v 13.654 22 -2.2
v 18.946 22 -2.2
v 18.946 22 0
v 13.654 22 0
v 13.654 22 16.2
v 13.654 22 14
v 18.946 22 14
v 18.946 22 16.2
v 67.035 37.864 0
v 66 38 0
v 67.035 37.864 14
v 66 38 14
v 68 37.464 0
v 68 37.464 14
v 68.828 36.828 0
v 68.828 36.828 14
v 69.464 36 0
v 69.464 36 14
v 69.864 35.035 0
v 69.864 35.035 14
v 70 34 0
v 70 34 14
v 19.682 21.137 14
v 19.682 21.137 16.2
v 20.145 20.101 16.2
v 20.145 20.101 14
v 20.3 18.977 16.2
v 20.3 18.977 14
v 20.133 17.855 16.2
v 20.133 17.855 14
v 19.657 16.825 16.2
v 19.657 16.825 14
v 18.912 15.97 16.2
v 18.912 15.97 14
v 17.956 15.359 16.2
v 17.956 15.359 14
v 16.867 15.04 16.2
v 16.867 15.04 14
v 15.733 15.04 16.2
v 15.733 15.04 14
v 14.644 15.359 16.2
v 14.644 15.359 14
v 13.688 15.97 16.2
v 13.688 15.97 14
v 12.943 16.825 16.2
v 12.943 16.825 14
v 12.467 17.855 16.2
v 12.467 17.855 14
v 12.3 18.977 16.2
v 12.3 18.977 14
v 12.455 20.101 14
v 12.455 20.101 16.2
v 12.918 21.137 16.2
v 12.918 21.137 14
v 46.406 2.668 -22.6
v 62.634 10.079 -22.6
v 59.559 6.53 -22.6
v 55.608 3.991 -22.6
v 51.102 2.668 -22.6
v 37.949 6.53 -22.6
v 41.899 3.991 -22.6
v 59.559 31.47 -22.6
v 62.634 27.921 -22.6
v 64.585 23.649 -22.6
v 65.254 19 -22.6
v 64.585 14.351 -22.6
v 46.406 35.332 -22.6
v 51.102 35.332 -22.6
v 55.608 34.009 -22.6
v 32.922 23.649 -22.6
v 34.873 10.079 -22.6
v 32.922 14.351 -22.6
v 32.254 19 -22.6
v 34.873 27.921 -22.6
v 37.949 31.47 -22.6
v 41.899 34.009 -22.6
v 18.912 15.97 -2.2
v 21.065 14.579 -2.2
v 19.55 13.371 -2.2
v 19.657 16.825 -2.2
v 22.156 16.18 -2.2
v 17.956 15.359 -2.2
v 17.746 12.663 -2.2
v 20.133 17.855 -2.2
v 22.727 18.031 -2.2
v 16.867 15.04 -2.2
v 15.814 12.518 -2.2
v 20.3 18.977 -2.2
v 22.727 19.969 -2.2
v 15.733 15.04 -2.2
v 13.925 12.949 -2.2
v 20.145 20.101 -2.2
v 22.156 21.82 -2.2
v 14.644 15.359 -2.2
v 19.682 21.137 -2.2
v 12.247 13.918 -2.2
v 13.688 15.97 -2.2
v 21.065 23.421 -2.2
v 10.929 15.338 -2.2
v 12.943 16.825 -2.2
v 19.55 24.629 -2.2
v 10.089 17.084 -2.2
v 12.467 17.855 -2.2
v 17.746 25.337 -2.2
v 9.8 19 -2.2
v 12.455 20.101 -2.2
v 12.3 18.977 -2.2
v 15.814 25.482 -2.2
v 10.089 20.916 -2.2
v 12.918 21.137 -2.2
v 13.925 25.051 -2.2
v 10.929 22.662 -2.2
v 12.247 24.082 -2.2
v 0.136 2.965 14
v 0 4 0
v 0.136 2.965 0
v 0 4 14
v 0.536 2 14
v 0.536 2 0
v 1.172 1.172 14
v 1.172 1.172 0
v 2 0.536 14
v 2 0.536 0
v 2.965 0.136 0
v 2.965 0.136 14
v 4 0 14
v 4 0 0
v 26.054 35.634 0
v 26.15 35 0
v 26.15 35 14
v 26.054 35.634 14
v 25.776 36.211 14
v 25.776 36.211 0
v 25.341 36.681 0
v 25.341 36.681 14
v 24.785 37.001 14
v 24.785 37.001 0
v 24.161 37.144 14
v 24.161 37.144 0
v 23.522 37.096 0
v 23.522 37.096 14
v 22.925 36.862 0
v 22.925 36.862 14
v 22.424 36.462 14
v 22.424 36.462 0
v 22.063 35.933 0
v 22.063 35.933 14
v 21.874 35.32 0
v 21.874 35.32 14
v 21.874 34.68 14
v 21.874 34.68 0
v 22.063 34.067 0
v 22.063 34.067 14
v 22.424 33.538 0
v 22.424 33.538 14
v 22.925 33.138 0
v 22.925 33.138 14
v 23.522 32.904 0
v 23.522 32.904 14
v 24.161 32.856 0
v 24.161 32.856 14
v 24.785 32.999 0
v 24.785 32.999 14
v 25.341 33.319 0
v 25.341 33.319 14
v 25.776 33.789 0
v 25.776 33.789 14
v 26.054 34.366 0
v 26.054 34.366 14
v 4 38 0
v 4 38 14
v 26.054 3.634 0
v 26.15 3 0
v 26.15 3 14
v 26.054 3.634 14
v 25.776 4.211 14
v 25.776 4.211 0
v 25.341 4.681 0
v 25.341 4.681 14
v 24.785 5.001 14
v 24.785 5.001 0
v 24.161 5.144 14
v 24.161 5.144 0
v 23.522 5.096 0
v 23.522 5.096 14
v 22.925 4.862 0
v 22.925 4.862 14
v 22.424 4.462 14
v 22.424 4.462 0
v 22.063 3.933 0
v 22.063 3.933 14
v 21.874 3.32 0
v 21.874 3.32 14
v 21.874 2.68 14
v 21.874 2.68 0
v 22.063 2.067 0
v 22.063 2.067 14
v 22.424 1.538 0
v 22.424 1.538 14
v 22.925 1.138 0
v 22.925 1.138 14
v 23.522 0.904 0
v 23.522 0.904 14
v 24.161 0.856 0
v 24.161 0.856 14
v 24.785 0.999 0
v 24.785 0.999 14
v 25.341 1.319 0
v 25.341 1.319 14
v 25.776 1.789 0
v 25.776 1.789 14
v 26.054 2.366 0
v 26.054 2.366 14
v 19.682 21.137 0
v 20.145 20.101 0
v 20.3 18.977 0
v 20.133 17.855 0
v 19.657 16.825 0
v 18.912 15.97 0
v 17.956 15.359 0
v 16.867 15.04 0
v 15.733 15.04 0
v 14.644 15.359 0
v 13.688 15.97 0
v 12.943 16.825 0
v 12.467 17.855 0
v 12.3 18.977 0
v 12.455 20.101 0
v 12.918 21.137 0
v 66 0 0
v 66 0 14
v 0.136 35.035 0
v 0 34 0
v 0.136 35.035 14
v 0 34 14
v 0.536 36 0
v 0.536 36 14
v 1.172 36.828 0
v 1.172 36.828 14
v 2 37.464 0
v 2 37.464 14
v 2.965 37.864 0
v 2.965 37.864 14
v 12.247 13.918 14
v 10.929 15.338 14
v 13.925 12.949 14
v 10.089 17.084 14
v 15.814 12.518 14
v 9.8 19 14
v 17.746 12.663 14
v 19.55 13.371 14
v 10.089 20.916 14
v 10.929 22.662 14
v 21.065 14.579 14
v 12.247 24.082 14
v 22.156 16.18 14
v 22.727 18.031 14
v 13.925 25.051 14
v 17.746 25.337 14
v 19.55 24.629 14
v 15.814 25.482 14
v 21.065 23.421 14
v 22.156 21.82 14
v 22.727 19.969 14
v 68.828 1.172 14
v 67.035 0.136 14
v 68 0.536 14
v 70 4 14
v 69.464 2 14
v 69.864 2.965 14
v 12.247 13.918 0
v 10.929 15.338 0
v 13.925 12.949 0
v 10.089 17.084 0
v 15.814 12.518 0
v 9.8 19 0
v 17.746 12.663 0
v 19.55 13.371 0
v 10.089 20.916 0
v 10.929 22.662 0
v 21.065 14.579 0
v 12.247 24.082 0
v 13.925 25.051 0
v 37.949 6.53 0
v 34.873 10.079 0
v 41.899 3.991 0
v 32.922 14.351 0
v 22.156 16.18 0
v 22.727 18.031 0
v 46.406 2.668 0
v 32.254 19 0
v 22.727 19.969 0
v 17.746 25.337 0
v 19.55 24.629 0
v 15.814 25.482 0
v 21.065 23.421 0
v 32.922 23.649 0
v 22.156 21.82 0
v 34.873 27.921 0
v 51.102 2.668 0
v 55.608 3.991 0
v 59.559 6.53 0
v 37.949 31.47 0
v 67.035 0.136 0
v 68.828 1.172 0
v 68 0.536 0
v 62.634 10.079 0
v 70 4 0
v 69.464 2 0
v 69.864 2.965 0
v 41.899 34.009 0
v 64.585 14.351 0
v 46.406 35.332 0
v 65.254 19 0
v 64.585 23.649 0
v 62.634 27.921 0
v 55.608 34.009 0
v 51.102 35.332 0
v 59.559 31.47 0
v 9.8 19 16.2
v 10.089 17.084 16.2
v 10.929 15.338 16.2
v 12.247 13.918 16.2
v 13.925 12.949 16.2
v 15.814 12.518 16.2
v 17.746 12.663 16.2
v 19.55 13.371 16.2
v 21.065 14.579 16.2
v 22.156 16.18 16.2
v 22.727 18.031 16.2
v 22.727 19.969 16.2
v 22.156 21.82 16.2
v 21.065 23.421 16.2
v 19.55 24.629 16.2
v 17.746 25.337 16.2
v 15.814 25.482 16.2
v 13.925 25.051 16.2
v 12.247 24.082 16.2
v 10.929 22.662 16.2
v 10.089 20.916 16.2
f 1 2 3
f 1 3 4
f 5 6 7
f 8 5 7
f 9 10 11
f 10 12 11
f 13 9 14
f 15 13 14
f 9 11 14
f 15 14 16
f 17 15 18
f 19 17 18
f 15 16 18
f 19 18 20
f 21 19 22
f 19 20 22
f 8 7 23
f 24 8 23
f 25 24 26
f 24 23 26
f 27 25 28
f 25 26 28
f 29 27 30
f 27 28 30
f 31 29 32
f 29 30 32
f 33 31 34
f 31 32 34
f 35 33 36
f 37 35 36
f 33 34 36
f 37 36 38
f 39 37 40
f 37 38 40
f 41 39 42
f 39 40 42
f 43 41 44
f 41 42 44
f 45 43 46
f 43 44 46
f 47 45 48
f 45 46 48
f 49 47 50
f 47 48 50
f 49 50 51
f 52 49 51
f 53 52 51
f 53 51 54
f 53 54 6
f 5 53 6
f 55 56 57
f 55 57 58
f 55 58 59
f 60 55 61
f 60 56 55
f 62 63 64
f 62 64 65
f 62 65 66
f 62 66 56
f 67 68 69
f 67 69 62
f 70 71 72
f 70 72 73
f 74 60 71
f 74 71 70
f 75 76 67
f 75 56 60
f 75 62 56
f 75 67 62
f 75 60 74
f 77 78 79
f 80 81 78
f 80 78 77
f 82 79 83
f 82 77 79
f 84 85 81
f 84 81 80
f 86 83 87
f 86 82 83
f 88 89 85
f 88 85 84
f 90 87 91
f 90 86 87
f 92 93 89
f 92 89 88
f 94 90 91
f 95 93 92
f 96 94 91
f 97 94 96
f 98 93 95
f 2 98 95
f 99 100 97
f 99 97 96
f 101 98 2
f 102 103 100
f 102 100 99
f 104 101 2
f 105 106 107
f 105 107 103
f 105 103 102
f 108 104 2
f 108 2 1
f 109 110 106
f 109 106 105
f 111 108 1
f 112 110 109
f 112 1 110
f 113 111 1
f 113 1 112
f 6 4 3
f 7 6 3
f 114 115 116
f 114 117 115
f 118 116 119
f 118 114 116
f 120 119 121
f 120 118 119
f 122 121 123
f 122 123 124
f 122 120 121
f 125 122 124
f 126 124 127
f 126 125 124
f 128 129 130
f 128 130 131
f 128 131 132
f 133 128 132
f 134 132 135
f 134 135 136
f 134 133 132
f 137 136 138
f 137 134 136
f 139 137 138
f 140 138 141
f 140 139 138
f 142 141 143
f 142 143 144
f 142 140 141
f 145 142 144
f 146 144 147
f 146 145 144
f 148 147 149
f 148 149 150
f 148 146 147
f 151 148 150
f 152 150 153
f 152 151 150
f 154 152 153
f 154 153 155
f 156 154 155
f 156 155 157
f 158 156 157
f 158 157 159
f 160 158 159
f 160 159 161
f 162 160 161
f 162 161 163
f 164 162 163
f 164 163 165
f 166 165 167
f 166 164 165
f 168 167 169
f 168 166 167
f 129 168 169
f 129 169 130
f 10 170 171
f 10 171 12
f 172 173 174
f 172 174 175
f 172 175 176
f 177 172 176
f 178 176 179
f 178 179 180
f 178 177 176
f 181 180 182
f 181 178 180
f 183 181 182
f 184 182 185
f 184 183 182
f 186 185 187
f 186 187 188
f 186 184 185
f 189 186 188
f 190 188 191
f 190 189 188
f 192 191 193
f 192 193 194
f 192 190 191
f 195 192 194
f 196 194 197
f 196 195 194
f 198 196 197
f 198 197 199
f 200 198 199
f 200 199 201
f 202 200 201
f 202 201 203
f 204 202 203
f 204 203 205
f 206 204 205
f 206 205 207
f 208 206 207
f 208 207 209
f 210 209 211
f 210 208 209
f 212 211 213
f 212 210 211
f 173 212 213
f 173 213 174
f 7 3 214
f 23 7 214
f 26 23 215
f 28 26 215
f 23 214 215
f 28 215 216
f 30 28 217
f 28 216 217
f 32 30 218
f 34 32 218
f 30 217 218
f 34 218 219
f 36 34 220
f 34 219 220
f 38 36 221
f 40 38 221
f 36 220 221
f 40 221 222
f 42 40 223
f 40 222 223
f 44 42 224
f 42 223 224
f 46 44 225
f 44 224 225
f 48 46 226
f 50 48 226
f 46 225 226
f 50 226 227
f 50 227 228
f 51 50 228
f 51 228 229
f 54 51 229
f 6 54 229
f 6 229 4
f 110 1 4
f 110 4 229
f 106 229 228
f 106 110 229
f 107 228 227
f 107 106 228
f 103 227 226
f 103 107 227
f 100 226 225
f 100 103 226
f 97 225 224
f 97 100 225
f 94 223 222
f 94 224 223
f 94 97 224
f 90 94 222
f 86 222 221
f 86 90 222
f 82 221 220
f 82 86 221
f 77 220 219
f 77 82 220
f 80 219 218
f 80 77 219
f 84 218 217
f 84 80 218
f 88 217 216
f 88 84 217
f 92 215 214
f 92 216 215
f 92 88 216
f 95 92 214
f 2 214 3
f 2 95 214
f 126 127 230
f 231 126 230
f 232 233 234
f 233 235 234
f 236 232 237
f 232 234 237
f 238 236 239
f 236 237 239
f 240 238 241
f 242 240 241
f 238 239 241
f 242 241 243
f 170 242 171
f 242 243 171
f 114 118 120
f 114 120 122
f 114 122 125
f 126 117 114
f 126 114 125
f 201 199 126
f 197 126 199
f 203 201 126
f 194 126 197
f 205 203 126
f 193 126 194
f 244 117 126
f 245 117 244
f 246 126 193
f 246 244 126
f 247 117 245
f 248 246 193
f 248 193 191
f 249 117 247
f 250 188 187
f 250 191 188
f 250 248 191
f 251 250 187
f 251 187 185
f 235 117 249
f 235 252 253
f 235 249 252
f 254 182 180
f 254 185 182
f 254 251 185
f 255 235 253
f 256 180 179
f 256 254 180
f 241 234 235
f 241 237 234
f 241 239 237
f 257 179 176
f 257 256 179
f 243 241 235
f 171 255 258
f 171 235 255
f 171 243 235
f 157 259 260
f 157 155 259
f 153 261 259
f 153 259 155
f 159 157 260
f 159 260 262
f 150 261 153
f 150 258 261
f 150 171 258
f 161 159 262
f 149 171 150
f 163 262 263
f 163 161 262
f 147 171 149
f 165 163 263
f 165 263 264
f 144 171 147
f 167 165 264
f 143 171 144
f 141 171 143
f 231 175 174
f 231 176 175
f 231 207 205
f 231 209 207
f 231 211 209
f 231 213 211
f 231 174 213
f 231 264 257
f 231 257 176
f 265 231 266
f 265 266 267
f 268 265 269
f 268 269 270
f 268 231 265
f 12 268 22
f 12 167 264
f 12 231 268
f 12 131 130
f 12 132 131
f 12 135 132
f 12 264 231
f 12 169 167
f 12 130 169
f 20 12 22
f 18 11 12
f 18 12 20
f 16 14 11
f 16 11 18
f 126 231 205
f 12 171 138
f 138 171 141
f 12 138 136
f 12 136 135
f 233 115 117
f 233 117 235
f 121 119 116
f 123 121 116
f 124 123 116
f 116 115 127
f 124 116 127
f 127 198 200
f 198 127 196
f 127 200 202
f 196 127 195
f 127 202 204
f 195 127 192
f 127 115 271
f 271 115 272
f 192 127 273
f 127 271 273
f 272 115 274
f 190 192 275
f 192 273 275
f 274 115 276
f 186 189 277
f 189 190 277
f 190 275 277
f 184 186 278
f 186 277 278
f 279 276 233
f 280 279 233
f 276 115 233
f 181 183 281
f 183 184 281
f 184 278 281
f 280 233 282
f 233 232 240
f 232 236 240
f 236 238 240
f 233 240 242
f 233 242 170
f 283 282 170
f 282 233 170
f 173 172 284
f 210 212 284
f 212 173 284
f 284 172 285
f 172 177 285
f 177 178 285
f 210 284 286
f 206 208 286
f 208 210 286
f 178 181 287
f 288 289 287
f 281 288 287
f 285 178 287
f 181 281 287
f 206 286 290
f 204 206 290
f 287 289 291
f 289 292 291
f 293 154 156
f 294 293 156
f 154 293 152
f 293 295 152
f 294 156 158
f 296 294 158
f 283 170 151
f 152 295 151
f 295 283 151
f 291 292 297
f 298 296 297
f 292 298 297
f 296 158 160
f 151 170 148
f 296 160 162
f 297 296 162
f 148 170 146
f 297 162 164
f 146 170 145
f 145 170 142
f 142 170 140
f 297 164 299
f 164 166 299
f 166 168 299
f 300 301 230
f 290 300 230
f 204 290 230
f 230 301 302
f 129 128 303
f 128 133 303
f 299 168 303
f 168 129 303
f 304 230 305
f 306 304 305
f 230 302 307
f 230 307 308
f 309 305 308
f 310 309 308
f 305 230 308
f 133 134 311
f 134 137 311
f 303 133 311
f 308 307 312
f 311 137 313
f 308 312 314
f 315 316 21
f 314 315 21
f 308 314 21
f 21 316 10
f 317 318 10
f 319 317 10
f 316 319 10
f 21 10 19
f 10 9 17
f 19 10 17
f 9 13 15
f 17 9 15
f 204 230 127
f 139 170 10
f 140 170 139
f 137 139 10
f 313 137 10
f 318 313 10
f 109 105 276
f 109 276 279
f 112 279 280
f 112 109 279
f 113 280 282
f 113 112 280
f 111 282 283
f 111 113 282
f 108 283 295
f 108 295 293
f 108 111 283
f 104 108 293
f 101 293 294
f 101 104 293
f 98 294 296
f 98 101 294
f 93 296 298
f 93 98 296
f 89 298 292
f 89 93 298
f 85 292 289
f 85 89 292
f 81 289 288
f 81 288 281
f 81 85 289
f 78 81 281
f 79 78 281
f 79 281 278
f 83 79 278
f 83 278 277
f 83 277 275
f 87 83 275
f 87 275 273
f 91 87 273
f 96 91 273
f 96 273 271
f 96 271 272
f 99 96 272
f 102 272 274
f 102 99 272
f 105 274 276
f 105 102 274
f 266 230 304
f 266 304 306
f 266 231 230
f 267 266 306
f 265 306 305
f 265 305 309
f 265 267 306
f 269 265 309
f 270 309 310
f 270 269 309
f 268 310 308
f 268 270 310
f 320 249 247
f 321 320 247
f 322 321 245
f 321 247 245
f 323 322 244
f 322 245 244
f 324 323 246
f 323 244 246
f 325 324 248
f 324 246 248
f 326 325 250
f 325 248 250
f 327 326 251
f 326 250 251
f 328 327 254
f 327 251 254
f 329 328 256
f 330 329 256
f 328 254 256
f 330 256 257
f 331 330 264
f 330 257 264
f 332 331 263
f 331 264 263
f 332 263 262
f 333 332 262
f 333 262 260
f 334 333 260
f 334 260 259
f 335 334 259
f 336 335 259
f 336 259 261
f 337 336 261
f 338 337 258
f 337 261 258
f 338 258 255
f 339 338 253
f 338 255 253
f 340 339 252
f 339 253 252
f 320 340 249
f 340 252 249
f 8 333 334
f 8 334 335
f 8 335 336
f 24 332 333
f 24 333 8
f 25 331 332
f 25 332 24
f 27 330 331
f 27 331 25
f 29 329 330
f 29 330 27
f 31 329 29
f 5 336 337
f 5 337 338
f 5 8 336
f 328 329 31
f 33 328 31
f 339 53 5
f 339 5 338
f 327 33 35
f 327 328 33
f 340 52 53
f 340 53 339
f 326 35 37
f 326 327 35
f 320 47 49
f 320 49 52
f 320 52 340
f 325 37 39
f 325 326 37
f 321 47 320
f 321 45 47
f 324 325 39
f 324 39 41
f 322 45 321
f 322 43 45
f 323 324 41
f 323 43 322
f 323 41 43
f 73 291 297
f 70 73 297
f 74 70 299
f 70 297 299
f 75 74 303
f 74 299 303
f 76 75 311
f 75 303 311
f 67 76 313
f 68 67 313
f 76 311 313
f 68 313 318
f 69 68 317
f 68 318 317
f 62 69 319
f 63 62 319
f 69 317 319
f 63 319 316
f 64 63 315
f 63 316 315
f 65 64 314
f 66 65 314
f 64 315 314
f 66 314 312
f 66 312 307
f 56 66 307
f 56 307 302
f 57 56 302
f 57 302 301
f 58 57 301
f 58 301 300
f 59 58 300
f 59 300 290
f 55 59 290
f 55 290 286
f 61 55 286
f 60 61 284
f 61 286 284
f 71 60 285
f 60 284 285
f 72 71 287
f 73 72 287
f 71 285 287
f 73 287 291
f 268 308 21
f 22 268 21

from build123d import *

# Parameters (mm, degrees)
SKETCH1_W           = 70
SKETCH1_H           = 38
SKETCH1_R           = 2.15
BOSS_EXTRUDE1_DEPTH = 14
FILLET1_R           = 4
SKETCH2_R           = 16.5
BOSS_EXTRUDE2_DEPTH = 22.6
BOSS_EXTRUDE3_START = 2.2
SKETCH3_R           = 6.5
BOSS_EXTRUDE3_DEPTH = 2.2
SKETCH4_R           = 6.5
BOSS_EXTRUDE4_DEPTH = 2.2


with BuildPart() as part:
    # Sketch1 → Boss-Extrude1 (new body)
    with BuildSketch(Plane.XY):
        with Locations((35, 19)):
            Rectangle(SKETCH1_W, SKETCH1_H)
        with Locations((24, 35)):
            Circle(SKETCH1_R, mode=Mode.SUBTRACT)
        with Locations((24, 3)):
            Circle(SKETCH1_R, mode=Mode.SUBTRACT)
        with BuildLine():
            Line((13.654248689, 22), (18.945751311, 22))
            ThreePointArc((18.945751311, 22), (16.3, 15), (13.654248689, 22))
        make_face(mode=Mode.SUBTRACT)
    extrude(amount=BOSS_EXTRUDE1_DEPTH)

    # Fillet1
    fillet1_edges = [part.edges().sort_by_distance(p)[0] for p in [
        (0, 38, 7),
        (70, 38, 7),
        (70, 0, 7),
        (0, 0, 7),
    ]]
    fillet(fillet1_edges, radius=FILLET1_R)

    # Sketch2 → Boss-Extrude2 (add)
    with BuildSketch(Plane(origin=(0, 0, 0), x_dir=(-1, 0, 0), z_dir=(0, 0, -1))):
        with Locations((-48.753788749, 19)):
            Circle(SKETCH2_R)
    extrude(amount=BOSS_EXTRUDE2_DEPTH)

    # Sketch3 → Boss-Extrude3 (add)
    with BuildSketch(Plane(origin=(0, 0, 0), x_dir=(-1, 0, 0), z_dir=(0, 0, -1)).offset(BOSS_EXTRUDE3_START)):
        with Locations((-16.3, 19)):
            Circle(SKETCH3_R)
        with BuildLine():
            Line((-18.945751311, 22), (-13.654248689, 22))
            ThreePointArc((-13.654248689, 22), (-16.3, 15), (-18.945751311, 22))
        make_face(mode=Mode.SUBTRACT)
    extrude(amount=-BOSS_EXTRUDE3_DEPTH)

    # Sketch4 → Boss-Extrude4 (add)
    with BuildSketch(Plane.XY.offset(14)):
        with Locations(Location((16.3, 19, 0), (0, 0, 180))):
            Circle(SKETCH4_R)
        with BuildLine():
            Line((13.654248689, 22), (18.945751311, 22))
            ThreePointArc((18.945751311, 22), (16.3, 15), (13.654248689, 22))
        make_face(mode=Mode.SUBTRACT)
    extrude(amount=BOSS_EXTRUDE4_DEPTH)


solid = part.part
